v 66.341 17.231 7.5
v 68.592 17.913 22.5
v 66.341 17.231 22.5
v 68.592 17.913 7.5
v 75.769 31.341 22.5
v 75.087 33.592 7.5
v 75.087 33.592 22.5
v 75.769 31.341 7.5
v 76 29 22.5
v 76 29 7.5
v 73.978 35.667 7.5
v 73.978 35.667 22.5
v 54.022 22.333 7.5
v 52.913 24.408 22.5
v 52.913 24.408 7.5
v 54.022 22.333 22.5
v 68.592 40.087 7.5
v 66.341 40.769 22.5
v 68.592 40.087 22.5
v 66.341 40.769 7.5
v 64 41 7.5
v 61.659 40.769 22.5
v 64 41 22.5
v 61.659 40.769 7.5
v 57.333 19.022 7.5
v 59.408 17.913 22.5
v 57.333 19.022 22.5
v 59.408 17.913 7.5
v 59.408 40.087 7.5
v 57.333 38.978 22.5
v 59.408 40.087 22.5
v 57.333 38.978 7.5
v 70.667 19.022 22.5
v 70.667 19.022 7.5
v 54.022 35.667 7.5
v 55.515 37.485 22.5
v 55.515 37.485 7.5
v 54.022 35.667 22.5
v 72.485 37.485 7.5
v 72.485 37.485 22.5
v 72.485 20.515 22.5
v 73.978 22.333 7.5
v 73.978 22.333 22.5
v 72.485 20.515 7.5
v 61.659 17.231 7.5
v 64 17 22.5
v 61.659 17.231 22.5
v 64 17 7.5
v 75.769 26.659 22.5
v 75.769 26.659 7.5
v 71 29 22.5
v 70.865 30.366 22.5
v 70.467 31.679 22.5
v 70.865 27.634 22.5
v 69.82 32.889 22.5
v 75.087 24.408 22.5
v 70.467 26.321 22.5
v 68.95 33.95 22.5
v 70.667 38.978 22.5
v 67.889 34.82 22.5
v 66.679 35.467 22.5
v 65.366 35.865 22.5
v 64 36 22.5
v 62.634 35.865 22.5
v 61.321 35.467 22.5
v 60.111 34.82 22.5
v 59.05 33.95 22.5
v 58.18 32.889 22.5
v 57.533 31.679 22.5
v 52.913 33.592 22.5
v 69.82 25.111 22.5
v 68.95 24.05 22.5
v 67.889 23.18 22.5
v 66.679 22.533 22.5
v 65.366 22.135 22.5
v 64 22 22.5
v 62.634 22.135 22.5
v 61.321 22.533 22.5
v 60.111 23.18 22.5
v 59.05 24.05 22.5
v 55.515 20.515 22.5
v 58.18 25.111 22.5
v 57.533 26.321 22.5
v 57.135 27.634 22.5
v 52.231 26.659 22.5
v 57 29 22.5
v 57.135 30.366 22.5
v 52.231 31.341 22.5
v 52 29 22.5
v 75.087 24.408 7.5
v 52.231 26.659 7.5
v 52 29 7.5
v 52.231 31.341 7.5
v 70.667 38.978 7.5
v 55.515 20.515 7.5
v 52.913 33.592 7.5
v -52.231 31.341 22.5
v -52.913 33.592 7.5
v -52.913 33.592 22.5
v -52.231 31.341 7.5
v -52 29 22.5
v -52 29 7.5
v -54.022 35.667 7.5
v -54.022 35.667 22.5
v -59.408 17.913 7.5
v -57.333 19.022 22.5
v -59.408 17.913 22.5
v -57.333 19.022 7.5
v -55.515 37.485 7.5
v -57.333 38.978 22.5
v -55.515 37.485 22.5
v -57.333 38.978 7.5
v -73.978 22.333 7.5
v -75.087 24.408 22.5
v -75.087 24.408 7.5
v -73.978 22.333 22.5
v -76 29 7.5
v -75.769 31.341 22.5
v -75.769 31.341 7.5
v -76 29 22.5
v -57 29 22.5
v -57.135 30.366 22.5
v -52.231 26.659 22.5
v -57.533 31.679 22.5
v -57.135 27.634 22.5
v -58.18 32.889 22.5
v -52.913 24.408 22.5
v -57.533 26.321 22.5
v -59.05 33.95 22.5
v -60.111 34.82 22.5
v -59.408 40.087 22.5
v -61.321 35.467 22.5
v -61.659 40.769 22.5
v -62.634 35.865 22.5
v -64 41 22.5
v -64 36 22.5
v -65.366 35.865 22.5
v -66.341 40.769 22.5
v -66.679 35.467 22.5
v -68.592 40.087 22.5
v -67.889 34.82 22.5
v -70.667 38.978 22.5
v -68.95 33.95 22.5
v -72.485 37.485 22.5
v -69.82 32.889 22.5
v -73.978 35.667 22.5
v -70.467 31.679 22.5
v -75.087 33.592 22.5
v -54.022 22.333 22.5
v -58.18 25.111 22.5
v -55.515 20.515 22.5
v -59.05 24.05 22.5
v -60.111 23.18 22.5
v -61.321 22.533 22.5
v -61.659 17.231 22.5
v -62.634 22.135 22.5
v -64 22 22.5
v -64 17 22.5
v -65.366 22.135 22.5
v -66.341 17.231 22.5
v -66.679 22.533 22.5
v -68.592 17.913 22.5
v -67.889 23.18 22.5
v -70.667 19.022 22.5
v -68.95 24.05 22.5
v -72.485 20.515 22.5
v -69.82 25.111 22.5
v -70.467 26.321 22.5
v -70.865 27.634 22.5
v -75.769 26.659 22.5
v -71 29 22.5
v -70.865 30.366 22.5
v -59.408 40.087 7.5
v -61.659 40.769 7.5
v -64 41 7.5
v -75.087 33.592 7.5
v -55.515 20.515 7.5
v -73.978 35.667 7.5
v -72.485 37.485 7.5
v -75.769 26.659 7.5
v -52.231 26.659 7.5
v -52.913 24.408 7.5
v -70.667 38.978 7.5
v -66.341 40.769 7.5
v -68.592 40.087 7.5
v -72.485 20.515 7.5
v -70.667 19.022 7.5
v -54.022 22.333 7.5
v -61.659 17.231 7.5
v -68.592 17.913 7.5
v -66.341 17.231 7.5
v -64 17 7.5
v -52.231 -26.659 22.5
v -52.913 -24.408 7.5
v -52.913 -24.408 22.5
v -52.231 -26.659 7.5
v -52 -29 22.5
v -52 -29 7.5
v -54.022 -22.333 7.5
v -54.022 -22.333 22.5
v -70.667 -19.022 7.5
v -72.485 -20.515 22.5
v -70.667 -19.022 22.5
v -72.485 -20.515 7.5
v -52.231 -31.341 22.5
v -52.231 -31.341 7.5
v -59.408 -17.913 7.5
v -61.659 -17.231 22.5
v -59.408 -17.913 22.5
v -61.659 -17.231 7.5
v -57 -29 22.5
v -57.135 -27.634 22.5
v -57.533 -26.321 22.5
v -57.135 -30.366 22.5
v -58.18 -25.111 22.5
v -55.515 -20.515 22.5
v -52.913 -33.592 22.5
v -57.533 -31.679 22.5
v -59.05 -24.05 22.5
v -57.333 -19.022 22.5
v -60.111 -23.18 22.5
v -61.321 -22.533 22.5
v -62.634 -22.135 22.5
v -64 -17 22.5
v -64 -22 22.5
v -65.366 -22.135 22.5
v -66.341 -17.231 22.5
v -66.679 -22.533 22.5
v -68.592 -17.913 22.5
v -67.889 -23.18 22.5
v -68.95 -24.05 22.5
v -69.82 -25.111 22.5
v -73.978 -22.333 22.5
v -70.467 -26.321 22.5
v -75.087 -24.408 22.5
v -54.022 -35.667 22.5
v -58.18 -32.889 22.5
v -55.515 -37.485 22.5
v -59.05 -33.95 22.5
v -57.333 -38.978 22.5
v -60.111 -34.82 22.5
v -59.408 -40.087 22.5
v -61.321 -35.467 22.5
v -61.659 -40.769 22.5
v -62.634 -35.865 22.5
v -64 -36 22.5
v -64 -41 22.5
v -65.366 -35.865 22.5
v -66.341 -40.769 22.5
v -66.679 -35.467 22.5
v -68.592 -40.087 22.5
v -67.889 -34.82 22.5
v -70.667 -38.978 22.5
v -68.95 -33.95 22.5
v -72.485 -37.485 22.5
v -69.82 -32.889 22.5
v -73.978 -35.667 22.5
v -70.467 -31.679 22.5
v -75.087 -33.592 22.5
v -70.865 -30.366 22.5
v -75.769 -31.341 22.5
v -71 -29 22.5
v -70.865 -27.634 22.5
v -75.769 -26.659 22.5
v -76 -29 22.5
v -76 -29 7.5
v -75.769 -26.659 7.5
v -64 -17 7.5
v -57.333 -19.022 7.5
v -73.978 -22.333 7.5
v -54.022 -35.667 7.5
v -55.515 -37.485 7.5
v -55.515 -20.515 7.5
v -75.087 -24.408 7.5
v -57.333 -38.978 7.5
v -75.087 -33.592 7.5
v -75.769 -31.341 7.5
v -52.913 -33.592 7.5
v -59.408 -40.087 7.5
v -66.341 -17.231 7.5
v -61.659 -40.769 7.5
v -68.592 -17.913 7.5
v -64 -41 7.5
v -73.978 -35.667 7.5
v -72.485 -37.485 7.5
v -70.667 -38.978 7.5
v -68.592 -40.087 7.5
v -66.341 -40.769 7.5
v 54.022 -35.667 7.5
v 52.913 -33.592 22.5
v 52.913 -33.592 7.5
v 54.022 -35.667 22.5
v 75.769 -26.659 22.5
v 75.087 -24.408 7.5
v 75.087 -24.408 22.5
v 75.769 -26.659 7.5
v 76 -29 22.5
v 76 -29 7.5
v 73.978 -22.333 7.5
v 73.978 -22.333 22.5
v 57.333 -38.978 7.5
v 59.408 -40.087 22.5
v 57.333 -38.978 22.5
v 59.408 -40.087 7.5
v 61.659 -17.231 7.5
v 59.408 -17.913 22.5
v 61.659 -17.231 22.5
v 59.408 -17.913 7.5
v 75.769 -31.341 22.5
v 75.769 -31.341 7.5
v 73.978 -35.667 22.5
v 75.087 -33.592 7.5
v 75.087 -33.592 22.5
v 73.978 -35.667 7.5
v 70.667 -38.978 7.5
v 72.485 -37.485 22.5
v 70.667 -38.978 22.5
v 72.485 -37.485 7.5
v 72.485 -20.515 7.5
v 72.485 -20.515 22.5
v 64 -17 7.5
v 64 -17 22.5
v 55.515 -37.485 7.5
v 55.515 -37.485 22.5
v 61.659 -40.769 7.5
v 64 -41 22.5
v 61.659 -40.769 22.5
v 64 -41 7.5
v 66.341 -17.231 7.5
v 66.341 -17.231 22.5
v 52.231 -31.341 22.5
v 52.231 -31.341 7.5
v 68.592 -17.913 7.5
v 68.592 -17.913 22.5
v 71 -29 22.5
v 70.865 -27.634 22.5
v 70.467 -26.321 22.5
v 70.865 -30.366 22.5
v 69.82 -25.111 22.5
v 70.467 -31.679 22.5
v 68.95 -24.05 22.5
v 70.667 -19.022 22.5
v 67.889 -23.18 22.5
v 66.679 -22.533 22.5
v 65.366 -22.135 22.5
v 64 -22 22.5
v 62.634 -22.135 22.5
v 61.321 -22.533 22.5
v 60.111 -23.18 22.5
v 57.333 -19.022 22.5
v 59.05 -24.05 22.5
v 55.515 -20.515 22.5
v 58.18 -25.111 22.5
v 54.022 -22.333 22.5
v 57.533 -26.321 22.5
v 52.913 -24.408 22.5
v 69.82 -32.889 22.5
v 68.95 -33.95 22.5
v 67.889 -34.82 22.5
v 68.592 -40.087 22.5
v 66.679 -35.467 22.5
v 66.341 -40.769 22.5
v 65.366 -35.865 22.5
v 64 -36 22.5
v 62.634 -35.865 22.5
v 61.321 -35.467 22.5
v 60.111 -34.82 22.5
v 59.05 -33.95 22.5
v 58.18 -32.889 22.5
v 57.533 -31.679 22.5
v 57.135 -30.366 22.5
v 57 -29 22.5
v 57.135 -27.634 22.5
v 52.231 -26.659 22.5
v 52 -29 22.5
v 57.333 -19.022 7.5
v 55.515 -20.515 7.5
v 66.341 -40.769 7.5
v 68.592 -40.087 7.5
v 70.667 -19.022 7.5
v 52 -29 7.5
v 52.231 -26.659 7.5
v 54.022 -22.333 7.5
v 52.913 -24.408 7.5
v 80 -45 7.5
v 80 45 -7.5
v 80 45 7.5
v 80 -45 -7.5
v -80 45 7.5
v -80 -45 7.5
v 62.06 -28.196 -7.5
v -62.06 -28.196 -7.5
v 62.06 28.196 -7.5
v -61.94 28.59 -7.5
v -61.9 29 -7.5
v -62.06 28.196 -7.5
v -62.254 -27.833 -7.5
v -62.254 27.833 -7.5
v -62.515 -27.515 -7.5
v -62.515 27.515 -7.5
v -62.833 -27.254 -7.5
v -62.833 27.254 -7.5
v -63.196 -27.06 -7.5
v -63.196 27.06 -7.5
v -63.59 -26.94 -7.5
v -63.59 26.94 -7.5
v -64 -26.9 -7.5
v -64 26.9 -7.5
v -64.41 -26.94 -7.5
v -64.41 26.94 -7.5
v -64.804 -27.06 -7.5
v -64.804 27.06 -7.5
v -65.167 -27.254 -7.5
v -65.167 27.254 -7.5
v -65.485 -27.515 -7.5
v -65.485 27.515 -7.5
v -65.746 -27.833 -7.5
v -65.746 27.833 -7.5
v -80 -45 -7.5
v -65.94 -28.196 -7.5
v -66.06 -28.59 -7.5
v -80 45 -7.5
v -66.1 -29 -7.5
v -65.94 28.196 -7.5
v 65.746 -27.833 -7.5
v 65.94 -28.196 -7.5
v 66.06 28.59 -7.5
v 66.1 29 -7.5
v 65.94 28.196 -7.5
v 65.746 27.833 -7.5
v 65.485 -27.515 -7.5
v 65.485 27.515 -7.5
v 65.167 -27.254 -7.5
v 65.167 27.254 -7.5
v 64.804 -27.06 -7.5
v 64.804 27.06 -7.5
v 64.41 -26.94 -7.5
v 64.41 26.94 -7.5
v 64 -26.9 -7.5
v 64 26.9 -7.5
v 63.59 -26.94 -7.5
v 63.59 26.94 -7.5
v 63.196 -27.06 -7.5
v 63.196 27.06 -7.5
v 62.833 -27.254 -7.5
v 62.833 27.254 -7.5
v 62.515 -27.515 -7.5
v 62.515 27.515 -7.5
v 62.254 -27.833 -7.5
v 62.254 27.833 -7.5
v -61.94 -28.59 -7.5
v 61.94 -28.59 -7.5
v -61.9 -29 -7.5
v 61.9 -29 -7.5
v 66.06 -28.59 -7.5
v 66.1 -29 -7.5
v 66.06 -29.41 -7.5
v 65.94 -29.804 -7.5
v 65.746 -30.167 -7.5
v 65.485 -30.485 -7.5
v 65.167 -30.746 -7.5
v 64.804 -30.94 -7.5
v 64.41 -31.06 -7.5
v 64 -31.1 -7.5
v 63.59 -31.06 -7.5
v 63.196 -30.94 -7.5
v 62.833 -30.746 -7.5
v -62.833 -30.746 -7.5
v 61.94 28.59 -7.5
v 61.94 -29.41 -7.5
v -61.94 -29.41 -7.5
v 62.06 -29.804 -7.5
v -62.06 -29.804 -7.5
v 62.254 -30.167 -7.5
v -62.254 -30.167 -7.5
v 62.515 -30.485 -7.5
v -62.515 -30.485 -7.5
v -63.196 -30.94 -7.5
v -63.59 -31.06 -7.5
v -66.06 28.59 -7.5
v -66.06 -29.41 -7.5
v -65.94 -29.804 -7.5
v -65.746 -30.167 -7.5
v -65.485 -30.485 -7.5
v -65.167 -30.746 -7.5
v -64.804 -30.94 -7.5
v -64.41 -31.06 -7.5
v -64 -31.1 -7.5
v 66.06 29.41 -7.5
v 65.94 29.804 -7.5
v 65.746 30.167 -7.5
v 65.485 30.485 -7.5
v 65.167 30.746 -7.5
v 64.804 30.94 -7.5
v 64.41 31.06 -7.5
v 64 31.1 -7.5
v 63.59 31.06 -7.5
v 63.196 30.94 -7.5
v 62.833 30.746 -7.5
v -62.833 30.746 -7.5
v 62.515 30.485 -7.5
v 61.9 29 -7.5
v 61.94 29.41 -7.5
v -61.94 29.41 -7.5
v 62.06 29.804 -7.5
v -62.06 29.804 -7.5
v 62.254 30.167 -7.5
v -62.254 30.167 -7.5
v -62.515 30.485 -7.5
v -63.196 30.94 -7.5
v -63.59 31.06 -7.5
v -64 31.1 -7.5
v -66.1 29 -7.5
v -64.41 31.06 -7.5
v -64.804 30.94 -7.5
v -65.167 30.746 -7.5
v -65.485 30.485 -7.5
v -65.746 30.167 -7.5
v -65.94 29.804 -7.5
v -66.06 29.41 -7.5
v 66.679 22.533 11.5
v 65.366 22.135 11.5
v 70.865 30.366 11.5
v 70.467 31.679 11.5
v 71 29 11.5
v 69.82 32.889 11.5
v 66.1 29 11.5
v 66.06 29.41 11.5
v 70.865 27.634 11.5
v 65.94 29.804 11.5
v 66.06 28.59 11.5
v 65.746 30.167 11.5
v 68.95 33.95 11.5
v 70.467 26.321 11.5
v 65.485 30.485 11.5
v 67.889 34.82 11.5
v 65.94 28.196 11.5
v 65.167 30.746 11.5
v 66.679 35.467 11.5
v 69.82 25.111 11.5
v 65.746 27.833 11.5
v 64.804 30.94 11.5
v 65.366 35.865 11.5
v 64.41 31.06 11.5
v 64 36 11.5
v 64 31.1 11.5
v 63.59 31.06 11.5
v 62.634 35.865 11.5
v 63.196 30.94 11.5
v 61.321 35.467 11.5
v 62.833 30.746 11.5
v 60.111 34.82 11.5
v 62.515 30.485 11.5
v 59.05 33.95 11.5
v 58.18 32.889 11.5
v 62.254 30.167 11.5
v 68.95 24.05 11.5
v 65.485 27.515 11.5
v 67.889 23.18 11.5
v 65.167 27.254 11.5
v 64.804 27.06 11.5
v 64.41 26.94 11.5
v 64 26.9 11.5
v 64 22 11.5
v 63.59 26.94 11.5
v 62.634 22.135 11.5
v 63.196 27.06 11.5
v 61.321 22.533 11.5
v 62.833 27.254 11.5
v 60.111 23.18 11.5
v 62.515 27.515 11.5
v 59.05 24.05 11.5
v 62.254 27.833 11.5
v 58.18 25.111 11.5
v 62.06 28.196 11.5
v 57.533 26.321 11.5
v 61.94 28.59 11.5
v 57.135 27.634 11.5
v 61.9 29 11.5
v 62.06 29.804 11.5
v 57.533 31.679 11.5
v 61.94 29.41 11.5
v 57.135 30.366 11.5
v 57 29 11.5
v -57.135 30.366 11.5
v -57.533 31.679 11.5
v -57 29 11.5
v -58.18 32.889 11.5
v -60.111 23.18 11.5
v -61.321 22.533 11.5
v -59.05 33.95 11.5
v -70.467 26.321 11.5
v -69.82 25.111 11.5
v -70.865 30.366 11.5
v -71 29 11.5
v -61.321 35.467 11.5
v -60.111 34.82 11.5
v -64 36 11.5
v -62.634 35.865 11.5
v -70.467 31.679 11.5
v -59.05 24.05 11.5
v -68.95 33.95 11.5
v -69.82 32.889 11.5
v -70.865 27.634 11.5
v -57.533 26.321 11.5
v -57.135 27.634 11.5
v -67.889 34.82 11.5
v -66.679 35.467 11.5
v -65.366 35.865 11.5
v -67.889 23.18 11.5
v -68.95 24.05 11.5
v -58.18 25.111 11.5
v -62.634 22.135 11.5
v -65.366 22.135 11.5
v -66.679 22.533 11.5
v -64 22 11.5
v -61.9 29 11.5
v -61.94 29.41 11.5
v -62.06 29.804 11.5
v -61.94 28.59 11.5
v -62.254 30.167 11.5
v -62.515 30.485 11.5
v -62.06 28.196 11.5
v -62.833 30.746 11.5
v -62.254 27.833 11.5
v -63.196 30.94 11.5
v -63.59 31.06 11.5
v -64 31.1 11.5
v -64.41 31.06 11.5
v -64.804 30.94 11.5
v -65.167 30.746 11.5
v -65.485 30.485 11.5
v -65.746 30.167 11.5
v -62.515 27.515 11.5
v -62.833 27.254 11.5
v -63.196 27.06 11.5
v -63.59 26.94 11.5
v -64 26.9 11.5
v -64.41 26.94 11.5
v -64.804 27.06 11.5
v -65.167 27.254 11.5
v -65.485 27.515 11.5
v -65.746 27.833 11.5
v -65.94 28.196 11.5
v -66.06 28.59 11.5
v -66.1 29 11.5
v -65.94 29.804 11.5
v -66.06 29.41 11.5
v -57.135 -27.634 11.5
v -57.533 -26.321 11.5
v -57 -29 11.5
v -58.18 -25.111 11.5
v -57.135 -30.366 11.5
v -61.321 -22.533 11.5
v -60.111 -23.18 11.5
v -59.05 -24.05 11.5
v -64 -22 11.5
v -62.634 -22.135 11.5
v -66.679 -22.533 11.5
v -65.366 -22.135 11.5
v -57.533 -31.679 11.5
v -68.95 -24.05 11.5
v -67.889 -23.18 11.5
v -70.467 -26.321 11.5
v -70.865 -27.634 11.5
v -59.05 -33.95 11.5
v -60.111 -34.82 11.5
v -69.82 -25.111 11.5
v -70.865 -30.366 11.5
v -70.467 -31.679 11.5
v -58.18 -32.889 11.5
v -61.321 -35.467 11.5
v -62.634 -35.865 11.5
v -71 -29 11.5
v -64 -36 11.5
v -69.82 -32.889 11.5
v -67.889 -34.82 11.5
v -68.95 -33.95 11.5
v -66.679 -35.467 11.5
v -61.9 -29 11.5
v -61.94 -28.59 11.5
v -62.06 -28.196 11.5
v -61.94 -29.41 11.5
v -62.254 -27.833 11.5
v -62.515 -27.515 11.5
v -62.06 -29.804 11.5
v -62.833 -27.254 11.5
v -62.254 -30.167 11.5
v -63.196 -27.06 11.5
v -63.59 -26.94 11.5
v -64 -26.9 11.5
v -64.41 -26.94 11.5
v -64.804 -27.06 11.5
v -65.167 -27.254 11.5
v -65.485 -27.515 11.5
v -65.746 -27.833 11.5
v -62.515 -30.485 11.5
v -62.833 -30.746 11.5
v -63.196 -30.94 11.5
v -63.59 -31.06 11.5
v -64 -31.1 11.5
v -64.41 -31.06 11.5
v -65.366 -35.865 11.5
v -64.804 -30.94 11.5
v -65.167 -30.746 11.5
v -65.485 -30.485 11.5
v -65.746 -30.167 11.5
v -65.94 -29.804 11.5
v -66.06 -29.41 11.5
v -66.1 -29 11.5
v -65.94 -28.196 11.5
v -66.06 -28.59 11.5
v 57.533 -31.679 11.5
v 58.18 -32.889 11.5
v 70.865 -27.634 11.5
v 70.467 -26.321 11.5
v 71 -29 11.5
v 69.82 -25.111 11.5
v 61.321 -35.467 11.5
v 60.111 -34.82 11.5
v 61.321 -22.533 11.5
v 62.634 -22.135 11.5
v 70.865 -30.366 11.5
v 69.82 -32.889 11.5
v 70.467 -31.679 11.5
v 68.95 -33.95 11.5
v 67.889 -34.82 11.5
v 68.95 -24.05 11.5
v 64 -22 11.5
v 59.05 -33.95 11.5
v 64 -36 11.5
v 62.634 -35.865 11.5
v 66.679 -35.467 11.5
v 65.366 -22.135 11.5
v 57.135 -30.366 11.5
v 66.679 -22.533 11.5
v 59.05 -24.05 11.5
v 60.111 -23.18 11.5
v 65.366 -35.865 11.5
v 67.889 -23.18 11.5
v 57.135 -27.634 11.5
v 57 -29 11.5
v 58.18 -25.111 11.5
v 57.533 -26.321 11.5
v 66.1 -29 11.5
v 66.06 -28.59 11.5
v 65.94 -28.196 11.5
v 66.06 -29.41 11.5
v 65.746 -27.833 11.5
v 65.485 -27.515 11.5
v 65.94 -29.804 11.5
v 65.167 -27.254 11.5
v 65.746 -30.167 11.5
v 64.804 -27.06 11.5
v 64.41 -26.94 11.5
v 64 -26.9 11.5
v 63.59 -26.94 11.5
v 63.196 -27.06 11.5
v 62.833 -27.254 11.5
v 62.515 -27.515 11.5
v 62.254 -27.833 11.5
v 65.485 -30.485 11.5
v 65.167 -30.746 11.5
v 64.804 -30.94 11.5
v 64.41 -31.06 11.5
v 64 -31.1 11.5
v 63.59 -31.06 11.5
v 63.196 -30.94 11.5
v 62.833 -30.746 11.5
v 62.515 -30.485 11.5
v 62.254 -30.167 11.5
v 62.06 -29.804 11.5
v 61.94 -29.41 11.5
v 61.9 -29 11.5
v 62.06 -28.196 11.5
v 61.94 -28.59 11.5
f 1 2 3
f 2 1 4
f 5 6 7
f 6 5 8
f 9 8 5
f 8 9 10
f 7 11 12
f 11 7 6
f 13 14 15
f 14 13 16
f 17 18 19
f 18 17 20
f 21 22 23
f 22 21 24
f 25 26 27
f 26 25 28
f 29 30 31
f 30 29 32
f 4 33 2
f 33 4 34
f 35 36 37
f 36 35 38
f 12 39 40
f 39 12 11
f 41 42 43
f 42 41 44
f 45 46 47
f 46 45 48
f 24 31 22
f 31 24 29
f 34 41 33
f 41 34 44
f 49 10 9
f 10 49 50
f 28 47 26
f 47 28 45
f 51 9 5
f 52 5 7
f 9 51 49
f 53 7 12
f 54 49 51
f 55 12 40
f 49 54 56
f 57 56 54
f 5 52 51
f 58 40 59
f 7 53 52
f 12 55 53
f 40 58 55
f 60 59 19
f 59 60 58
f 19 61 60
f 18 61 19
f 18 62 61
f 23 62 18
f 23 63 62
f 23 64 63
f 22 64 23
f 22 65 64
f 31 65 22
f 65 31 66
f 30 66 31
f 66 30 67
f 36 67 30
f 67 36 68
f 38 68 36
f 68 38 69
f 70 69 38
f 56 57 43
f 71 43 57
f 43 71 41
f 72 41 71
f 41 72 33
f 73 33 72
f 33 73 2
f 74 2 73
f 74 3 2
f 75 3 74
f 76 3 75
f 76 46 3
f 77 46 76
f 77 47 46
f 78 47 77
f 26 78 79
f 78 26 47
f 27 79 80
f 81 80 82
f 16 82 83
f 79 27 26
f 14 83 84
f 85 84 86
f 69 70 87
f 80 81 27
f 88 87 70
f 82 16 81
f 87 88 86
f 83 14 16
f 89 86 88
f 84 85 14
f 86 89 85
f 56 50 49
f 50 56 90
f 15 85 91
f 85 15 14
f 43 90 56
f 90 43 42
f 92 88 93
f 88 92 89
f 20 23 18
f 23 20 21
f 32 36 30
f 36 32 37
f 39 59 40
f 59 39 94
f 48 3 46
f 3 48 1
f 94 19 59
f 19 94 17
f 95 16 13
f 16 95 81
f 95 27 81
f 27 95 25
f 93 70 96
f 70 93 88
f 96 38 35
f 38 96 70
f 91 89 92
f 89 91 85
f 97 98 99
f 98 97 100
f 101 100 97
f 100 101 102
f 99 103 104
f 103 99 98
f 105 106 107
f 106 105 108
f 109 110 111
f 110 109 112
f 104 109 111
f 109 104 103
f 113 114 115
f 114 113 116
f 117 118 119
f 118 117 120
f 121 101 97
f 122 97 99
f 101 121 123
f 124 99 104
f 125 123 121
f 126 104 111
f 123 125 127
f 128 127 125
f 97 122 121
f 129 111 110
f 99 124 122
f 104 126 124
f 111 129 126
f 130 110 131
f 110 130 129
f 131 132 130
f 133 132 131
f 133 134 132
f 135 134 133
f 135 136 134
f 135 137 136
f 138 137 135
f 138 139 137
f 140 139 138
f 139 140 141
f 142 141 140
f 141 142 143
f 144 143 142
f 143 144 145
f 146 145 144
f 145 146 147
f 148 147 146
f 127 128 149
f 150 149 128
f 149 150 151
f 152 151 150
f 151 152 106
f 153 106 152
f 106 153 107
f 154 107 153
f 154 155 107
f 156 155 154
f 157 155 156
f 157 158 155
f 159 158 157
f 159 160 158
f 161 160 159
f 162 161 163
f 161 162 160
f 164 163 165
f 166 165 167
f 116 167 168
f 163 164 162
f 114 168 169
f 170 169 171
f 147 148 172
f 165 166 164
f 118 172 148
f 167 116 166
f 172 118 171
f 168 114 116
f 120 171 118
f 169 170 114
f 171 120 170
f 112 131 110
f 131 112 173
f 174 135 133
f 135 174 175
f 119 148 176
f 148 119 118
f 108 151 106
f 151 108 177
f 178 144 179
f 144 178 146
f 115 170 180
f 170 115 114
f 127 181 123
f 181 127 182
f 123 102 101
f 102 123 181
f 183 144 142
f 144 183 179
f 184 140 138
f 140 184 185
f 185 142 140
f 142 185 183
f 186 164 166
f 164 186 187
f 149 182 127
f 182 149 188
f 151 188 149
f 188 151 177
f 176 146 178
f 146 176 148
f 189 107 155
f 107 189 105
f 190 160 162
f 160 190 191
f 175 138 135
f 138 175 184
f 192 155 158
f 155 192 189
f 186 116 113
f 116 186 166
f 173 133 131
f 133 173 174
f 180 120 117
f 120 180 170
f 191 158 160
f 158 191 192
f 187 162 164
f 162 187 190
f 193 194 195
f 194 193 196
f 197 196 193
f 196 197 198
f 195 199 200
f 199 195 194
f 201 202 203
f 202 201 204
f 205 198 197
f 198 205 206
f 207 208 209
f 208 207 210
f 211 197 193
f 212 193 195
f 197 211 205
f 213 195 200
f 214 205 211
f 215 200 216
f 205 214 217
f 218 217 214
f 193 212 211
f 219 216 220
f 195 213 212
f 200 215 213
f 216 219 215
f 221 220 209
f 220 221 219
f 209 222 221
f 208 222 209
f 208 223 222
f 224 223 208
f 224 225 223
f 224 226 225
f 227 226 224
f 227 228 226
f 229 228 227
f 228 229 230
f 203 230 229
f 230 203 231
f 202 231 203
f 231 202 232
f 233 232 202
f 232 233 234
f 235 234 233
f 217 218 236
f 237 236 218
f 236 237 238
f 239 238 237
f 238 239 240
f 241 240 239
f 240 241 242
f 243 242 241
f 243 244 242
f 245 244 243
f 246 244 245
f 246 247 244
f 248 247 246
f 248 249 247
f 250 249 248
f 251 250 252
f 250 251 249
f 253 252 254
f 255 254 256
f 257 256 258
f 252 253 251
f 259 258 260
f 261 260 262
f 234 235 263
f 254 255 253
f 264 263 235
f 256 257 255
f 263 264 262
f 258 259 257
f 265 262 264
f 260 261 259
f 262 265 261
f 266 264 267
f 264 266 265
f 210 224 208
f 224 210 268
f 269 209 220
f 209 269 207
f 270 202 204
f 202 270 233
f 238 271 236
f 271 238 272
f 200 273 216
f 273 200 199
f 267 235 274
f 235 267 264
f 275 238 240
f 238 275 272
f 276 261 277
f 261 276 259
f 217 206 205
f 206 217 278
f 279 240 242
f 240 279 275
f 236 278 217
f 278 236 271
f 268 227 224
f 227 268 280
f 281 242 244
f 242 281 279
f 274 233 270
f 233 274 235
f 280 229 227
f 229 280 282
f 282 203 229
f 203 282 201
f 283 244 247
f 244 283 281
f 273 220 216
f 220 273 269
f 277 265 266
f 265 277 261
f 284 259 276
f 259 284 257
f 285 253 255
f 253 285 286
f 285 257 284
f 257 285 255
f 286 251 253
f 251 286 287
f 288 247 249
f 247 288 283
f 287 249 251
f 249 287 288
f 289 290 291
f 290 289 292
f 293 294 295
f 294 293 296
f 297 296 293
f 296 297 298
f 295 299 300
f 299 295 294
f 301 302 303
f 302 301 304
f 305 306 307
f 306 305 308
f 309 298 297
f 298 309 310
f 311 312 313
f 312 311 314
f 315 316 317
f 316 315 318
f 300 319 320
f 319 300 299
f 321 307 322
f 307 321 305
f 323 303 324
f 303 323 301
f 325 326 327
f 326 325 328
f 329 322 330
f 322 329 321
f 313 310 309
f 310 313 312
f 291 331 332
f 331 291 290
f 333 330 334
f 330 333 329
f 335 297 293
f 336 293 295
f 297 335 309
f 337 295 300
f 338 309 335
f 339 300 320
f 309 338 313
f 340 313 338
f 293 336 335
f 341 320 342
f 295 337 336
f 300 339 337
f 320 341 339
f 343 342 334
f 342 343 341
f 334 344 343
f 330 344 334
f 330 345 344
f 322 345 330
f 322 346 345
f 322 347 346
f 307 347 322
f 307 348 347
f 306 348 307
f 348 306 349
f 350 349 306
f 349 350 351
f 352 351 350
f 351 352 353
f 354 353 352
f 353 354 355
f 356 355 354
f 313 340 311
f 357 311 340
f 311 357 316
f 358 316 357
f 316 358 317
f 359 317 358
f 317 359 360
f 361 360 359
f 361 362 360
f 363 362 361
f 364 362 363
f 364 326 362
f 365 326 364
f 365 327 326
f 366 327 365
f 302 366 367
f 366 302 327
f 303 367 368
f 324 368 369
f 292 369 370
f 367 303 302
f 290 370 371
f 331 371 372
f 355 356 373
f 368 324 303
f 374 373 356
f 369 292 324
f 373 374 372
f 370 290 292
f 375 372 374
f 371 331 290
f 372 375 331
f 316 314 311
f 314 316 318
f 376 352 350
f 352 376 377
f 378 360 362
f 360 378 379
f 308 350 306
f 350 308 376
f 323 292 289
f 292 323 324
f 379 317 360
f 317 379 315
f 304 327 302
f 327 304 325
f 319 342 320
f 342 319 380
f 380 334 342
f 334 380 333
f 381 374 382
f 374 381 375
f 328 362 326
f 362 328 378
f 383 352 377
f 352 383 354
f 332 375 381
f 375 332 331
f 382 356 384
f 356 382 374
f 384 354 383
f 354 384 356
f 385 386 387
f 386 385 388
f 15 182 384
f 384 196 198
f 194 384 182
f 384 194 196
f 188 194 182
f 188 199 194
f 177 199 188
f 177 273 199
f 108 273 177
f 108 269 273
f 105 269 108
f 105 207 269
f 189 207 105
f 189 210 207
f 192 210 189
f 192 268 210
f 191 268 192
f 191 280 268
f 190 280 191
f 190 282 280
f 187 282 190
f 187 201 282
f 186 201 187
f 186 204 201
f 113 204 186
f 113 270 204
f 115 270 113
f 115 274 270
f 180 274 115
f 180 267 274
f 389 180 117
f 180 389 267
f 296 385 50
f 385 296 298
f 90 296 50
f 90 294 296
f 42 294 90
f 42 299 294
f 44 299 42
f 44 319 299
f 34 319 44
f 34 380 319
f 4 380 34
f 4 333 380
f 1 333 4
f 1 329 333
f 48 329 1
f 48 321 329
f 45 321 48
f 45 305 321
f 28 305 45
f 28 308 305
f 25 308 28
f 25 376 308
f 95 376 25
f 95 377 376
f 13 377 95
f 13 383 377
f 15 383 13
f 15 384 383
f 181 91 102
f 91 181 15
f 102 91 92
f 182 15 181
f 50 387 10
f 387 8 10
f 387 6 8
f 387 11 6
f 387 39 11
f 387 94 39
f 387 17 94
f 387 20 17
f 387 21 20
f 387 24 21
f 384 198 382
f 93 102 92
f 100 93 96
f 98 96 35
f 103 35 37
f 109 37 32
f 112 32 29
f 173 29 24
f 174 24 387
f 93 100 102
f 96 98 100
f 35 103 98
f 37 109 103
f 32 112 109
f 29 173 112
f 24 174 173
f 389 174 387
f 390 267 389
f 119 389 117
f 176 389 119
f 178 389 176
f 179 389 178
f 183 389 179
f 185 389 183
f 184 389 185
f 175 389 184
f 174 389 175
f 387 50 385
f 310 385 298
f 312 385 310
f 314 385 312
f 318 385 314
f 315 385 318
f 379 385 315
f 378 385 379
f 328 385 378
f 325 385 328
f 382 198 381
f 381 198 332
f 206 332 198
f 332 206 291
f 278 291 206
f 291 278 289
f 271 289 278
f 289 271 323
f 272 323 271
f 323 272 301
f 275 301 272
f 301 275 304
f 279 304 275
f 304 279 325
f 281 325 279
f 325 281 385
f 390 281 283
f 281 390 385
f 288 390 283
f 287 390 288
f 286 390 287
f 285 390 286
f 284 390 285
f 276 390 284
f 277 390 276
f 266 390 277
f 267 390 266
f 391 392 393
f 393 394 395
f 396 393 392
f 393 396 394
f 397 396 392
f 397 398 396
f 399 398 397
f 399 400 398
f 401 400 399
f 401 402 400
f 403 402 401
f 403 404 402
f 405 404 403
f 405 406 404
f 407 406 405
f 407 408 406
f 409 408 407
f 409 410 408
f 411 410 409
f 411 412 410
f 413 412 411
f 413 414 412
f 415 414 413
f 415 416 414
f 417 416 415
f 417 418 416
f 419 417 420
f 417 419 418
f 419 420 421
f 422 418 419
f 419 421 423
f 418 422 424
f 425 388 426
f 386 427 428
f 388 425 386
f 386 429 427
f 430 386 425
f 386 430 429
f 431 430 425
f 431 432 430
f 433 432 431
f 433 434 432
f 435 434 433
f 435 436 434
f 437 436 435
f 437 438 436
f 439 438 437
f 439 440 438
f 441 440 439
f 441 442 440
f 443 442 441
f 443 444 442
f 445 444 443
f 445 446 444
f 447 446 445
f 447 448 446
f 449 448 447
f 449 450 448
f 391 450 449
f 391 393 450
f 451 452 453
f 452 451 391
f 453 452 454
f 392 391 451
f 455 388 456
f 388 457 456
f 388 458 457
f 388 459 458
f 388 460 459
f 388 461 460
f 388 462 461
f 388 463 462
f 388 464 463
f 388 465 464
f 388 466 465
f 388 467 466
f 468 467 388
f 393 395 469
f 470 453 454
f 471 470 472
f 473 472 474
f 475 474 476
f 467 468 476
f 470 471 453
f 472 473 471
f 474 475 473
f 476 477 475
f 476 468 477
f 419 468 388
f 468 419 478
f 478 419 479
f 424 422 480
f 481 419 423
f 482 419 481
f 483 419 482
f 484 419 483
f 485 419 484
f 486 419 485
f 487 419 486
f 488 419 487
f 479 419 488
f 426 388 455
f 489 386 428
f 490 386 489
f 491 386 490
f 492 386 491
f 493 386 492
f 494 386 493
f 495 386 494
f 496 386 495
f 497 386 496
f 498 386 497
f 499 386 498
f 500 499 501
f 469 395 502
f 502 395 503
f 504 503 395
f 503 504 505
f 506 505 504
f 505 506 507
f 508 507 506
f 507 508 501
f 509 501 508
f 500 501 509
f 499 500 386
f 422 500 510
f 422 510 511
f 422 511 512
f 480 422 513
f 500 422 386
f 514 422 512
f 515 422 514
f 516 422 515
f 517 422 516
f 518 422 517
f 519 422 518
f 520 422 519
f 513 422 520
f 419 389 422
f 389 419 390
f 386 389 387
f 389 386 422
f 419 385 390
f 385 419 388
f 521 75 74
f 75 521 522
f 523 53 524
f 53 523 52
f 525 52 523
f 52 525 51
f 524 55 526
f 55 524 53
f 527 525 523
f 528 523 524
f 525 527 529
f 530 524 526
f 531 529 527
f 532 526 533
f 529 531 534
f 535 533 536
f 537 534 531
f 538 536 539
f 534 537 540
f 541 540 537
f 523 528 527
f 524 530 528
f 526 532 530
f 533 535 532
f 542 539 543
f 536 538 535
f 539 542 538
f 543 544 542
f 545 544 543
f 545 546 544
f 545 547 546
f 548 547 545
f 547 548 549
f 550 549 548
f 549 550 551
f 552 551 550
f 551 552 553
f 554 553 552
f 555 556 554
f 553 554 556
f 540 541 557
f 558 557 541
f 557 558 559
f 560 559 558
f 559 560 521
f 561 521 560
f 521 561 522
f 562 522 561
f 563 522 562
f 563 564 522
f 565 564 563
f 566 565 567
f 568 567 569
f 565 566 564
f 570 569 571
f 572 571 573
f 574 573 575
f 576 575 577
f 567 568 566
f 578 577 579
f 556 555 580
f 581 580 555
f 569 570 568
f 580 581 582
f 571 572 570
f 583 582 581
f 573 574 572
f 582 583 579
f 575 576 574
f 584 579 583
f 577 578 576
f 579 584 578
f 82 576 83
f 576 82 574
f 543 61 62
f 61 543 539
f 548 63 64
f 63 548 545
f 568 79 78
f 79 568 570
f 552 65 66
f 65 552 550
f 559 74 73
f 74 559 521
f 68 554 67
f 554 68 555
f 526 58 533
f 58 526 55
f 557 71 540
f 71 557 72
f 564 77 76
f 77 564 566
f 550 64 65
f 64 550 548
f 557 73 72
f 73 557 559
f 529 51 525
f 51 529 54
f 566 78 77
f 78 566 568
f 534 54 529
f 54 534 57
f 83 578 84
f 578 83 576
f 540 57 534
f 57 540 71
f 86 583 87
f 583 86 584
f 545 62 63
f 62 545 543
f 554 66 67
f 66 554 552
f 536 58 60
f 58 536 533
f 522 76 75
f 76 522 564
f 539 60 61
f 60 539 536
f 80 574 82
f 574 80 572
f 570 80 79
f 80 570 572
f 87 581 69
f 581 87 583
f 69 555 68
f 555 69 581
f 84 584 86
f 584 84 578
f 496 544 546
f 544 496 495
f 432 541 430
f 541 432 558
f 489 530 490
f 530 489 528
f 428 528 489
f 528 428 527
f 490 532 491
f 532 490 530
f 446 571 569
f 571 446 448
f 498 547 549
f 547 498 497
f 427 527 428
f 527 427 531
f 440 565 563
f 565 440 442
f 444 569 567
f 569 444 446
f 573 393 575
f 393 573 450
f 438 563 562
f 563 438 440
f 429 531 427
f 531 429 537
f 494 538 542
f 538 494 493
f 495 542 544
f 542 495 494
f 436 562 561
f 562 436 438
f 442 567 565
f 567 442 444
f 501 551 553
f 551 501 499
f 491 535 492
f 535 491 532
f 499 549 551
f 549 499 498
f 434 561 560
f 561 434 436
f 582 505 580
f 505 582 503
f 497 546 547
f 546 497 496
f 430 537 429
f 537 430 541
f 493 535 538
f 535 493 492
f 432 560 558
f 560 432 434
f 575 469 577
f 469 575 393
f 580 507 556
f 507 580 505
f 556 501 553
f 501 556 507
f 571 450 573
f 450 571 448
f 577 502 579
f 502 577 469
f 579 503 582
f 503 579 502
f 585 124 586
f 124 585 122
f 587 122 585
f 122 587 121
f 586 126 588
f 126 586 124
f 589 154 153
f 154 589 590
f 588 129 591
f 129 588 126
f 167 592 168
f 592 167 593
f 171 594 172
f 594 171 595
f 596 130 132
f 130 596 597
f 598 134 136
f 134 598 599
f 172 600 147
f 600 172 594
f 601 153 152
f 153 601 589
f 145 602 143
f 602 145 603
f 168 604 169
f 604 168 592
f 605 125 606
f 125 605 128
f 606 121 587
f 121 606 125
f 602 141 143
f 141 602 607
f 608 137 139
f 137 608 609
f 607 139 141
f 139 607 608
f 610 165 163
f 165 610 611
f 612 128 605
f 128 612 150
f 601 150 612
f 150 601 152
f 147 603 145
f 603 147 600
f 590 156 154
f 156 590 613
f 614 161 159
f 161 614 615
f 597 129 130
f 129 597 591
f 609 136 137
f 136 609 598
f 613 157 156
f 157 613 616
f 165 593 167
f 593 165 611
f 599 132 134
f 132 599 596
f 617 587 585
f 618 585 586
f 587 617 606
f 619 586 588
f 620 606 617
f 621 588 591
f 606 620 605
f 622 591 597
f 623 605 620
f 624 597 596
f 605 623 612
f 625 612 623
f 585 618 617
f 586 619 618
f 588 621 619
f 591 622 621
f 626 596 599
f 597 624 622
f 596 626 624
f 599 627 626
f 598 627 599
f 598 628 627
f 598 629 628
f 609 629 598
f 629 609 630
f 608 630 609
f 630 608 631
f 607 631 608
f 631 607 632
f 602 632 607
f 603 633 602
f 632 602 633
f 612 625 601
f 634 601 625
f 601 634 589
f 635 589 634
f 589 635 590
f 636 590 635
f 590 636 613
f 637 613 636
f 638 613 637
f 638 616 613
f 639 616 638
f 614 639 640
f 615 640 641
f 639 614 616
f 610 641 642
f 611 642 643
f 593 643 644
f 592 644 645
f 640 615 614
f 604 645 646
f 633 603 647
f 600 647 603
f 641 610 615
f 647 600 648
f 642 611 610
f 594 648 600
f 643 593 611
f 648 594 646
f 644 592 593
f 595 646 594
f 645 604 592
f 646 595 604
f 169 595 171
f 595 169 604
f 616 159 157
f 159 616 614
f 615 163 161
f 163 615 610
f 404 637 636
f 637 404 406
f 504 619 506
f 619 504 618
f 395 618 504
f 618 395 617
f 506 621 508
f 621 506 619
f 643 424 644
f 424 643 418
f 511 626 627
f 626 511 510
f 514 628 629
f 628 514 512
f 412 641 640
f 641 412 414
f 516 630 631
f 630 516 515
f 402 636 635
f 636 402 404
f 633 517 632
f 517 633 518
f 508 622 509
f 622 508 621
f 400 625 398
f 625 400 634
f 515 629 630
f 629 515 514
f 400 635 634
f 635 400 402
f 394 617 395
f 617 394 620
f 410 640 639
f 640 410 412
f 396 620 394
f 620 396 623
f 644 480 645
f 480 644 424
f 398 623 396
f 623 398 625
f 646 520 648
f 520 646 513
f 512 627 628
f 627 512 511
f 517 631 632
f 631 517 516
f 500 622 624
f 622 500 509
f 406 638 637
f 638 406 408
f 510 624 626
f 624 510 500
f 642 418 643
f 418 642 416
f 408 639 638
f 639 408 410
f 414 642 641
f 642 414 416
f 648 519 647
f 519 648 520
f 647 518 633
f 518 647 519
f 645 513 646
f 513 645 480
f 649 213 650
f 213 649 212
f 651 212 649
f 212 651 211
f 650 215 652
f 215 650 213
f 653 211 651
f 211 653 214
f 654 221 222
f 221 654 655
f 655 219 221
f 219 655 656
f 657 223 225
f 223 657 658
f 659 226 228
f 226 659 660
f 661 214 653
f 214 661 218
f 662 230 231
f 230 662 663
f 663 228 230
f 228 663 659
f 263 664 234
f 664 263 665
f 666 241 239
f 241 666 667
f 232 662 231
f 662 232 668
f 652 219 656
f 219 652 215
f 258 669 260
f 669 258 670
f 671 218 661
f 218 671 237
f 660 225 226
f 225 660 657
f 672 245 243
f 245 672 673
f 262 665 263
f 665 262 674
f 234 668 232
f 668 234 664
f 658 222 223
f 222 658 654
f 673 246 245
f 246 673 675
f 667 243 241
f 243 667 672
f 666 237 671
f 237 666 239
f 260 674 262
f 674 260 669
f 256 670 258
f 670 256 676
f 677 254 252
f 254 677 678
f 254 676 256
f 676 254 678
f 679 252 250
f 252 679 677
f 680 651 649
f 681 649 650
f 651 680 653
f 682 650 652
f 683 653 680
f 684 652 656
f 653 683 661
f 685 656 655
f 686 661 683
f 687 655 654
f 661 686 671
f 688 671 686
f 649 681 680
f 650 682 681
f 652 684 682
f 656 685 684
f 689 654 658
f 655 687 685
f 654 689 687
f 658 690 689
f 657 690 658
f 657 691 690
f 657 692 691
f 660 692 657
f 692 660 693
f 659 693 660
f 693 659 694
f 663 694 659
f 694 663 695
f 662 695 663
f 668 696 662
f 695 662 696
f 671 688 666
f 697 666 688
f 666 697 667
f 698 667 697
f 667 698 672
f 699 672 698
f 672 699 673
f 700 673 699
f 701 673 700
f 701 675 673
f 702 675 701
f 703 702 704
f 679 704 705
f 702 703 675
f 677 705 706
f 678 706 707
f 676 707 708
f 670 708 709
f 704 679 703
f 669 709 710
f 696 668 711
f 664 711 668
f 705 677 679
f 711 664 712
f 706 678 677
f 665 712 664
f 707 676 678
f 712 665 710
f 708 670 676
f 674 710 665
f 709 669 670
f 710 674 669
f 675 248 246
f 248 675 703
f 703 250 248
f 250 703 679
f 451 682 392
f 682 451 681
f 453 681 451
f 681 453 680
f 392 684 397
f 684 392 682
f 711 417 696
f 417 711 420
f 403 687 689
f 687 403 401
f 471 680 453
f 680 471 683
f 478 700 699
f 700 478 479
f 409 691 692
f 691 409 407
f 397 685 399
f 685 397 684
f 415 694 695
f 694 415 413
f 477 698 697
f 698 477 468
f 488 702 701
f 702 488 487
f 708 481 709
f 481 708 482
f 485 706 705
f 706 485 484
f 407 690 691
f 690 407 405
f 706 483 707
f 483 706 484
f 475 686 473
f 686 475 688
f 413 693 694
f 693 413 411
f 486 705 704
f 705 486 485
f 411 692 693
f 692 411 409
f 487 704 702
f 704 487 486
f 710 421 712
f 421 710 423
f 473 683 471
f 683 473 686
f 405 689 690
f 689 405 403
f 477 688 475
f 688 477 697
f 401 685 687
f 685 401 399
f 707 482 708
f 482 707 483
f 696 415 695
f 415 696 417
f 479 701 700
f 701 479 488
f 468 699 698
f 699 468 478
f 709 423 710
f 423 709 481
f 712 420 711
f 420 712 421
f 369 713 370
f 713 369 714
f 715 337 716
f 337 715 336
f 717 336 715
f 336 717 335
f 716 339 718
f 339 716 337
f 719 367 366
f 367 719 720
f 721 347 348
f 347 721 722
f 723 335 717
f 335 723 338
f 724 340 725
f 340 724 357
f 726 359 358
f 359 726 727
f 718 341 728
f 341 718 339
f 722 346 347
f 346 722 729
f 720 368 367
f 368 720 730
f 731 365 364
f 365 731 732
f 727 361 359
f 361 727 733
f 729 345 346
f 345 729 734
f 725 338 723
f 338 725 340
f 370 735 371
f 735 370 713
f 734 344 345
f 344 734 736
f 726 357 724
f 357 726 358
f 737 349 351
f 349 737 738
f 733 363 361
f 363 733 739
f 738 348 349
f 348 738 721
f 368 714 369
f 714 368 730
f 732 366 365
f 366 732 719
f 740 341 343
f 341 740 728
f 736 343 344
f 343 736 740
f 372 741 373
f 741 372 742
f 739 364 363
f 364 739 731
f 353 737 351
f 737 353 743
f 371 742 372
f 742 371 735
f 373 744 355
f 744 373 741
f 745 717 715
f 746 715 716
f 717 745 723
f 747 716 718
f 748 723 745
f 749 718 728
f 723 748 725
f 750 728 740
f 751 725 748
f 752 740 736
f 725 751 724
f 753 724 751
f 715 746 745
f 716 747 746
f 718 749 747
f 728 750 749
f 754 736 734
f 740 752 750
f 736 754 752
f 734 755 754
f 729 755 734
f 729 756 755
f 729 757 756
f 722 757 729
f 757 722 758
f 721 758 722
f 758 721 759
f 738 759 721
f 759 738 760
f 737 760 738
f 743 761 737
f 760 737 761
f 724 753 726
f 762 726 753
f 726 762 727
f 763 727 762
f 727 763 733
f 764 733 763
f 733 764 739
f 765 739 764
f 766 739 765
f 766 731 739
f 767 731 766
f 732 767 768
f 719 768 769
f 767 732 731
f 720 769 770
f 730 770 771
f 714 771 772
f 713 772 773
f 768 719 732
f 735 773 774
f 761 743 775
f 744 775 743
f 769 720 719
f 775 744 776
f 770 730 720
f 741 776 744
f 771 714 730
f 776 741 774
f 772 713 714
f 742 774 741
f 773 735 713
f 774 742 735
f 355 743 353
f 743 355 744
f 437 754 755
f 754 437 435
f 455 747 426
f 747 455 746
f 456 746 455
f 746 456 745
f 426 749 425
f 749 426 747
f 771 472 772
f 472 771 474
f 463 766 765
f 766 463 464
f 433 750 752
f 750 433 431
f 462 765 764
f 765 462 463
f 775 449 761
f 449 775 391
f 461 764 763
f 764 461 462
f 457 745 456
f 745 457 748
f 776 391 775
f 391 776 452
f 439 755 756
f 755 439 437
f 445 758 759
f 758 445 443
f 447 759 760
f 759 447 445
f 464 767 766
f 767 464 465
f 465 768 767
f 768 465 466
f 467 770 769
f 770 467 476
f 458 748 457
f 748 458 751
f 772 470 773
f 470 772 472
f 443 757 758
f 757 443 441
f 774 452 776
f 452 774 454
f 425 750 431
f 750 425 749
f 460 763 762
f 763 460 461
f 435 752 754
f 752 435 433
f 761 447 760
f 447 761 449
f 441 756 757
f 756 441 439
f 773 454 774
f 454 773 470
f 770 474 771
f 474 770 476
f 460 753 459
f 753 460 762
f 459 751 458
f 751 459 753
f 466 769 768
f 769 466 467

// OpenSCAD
$fn = 32;

// ----------------------------------------------------------------------
// Socket pad plate
// bosses with counterbored sockets for the screws
// ----------------------------------------------------------------------

// --- parameters (mm) ---
base_t = 15;            // base plate thickness
seat_tol = 0.1;         // tolerance at the seating features
free_tol = 0.3;         // general tolerance on the free sizes
boss_h = 15;            // boss height above the base plate
boss_d = 24;            // boss diameter
socket_d = 14;          // socket diameter
socket_depth = 11;      // socket depth from the boss face
bolt_d = 4.2;           // screw clearance hole through the socket floor
plate = [160, 90, 15];  // overall size (x, y, z)
edge = 16;              // boss centre offset from the plate edge
pads = 4;               // boss count, one per corner

// --- derived feature positions (mm) ---
height = base_t + boss_h;        // = 30   overall height of the part
corner_x = plate[0] / 2 - edge;  // = 64   boss centre X
corner_y = plate[1] / 2 - edge;  // = 29   boss centre Y
feature_centers = [
  [corner_x, corner_y],
  [-corner_x, corner_y],
  [-corner_x, -corner_y],
  [corner_x, -corner_y]
];   // boss centres: sockets, holes and the pads themselves are placed from here

// base plate, bosses on feature_centers, socket + through hole in each
difference() {
  union() {
    cube(plate, center = true);
    for (centre = feature_centers)
      translate([centre[0], centre[1], plate[2] / 2 - 1])
        cylinder(d = boss_d, h = boss_h + 1);
  }
  for (centre = feature_centers) {
    translate([centre[0], centre[1], plate[2] / 2 + boss_h - socket_depth])
      cylinder(d = socket_d, h = socket_depth + 1);
    translate([centre[0], centre[1], -height])
      cylinder(d = bolt_d, h = 2 * height + 2);  // through the socket floor
  }
}
